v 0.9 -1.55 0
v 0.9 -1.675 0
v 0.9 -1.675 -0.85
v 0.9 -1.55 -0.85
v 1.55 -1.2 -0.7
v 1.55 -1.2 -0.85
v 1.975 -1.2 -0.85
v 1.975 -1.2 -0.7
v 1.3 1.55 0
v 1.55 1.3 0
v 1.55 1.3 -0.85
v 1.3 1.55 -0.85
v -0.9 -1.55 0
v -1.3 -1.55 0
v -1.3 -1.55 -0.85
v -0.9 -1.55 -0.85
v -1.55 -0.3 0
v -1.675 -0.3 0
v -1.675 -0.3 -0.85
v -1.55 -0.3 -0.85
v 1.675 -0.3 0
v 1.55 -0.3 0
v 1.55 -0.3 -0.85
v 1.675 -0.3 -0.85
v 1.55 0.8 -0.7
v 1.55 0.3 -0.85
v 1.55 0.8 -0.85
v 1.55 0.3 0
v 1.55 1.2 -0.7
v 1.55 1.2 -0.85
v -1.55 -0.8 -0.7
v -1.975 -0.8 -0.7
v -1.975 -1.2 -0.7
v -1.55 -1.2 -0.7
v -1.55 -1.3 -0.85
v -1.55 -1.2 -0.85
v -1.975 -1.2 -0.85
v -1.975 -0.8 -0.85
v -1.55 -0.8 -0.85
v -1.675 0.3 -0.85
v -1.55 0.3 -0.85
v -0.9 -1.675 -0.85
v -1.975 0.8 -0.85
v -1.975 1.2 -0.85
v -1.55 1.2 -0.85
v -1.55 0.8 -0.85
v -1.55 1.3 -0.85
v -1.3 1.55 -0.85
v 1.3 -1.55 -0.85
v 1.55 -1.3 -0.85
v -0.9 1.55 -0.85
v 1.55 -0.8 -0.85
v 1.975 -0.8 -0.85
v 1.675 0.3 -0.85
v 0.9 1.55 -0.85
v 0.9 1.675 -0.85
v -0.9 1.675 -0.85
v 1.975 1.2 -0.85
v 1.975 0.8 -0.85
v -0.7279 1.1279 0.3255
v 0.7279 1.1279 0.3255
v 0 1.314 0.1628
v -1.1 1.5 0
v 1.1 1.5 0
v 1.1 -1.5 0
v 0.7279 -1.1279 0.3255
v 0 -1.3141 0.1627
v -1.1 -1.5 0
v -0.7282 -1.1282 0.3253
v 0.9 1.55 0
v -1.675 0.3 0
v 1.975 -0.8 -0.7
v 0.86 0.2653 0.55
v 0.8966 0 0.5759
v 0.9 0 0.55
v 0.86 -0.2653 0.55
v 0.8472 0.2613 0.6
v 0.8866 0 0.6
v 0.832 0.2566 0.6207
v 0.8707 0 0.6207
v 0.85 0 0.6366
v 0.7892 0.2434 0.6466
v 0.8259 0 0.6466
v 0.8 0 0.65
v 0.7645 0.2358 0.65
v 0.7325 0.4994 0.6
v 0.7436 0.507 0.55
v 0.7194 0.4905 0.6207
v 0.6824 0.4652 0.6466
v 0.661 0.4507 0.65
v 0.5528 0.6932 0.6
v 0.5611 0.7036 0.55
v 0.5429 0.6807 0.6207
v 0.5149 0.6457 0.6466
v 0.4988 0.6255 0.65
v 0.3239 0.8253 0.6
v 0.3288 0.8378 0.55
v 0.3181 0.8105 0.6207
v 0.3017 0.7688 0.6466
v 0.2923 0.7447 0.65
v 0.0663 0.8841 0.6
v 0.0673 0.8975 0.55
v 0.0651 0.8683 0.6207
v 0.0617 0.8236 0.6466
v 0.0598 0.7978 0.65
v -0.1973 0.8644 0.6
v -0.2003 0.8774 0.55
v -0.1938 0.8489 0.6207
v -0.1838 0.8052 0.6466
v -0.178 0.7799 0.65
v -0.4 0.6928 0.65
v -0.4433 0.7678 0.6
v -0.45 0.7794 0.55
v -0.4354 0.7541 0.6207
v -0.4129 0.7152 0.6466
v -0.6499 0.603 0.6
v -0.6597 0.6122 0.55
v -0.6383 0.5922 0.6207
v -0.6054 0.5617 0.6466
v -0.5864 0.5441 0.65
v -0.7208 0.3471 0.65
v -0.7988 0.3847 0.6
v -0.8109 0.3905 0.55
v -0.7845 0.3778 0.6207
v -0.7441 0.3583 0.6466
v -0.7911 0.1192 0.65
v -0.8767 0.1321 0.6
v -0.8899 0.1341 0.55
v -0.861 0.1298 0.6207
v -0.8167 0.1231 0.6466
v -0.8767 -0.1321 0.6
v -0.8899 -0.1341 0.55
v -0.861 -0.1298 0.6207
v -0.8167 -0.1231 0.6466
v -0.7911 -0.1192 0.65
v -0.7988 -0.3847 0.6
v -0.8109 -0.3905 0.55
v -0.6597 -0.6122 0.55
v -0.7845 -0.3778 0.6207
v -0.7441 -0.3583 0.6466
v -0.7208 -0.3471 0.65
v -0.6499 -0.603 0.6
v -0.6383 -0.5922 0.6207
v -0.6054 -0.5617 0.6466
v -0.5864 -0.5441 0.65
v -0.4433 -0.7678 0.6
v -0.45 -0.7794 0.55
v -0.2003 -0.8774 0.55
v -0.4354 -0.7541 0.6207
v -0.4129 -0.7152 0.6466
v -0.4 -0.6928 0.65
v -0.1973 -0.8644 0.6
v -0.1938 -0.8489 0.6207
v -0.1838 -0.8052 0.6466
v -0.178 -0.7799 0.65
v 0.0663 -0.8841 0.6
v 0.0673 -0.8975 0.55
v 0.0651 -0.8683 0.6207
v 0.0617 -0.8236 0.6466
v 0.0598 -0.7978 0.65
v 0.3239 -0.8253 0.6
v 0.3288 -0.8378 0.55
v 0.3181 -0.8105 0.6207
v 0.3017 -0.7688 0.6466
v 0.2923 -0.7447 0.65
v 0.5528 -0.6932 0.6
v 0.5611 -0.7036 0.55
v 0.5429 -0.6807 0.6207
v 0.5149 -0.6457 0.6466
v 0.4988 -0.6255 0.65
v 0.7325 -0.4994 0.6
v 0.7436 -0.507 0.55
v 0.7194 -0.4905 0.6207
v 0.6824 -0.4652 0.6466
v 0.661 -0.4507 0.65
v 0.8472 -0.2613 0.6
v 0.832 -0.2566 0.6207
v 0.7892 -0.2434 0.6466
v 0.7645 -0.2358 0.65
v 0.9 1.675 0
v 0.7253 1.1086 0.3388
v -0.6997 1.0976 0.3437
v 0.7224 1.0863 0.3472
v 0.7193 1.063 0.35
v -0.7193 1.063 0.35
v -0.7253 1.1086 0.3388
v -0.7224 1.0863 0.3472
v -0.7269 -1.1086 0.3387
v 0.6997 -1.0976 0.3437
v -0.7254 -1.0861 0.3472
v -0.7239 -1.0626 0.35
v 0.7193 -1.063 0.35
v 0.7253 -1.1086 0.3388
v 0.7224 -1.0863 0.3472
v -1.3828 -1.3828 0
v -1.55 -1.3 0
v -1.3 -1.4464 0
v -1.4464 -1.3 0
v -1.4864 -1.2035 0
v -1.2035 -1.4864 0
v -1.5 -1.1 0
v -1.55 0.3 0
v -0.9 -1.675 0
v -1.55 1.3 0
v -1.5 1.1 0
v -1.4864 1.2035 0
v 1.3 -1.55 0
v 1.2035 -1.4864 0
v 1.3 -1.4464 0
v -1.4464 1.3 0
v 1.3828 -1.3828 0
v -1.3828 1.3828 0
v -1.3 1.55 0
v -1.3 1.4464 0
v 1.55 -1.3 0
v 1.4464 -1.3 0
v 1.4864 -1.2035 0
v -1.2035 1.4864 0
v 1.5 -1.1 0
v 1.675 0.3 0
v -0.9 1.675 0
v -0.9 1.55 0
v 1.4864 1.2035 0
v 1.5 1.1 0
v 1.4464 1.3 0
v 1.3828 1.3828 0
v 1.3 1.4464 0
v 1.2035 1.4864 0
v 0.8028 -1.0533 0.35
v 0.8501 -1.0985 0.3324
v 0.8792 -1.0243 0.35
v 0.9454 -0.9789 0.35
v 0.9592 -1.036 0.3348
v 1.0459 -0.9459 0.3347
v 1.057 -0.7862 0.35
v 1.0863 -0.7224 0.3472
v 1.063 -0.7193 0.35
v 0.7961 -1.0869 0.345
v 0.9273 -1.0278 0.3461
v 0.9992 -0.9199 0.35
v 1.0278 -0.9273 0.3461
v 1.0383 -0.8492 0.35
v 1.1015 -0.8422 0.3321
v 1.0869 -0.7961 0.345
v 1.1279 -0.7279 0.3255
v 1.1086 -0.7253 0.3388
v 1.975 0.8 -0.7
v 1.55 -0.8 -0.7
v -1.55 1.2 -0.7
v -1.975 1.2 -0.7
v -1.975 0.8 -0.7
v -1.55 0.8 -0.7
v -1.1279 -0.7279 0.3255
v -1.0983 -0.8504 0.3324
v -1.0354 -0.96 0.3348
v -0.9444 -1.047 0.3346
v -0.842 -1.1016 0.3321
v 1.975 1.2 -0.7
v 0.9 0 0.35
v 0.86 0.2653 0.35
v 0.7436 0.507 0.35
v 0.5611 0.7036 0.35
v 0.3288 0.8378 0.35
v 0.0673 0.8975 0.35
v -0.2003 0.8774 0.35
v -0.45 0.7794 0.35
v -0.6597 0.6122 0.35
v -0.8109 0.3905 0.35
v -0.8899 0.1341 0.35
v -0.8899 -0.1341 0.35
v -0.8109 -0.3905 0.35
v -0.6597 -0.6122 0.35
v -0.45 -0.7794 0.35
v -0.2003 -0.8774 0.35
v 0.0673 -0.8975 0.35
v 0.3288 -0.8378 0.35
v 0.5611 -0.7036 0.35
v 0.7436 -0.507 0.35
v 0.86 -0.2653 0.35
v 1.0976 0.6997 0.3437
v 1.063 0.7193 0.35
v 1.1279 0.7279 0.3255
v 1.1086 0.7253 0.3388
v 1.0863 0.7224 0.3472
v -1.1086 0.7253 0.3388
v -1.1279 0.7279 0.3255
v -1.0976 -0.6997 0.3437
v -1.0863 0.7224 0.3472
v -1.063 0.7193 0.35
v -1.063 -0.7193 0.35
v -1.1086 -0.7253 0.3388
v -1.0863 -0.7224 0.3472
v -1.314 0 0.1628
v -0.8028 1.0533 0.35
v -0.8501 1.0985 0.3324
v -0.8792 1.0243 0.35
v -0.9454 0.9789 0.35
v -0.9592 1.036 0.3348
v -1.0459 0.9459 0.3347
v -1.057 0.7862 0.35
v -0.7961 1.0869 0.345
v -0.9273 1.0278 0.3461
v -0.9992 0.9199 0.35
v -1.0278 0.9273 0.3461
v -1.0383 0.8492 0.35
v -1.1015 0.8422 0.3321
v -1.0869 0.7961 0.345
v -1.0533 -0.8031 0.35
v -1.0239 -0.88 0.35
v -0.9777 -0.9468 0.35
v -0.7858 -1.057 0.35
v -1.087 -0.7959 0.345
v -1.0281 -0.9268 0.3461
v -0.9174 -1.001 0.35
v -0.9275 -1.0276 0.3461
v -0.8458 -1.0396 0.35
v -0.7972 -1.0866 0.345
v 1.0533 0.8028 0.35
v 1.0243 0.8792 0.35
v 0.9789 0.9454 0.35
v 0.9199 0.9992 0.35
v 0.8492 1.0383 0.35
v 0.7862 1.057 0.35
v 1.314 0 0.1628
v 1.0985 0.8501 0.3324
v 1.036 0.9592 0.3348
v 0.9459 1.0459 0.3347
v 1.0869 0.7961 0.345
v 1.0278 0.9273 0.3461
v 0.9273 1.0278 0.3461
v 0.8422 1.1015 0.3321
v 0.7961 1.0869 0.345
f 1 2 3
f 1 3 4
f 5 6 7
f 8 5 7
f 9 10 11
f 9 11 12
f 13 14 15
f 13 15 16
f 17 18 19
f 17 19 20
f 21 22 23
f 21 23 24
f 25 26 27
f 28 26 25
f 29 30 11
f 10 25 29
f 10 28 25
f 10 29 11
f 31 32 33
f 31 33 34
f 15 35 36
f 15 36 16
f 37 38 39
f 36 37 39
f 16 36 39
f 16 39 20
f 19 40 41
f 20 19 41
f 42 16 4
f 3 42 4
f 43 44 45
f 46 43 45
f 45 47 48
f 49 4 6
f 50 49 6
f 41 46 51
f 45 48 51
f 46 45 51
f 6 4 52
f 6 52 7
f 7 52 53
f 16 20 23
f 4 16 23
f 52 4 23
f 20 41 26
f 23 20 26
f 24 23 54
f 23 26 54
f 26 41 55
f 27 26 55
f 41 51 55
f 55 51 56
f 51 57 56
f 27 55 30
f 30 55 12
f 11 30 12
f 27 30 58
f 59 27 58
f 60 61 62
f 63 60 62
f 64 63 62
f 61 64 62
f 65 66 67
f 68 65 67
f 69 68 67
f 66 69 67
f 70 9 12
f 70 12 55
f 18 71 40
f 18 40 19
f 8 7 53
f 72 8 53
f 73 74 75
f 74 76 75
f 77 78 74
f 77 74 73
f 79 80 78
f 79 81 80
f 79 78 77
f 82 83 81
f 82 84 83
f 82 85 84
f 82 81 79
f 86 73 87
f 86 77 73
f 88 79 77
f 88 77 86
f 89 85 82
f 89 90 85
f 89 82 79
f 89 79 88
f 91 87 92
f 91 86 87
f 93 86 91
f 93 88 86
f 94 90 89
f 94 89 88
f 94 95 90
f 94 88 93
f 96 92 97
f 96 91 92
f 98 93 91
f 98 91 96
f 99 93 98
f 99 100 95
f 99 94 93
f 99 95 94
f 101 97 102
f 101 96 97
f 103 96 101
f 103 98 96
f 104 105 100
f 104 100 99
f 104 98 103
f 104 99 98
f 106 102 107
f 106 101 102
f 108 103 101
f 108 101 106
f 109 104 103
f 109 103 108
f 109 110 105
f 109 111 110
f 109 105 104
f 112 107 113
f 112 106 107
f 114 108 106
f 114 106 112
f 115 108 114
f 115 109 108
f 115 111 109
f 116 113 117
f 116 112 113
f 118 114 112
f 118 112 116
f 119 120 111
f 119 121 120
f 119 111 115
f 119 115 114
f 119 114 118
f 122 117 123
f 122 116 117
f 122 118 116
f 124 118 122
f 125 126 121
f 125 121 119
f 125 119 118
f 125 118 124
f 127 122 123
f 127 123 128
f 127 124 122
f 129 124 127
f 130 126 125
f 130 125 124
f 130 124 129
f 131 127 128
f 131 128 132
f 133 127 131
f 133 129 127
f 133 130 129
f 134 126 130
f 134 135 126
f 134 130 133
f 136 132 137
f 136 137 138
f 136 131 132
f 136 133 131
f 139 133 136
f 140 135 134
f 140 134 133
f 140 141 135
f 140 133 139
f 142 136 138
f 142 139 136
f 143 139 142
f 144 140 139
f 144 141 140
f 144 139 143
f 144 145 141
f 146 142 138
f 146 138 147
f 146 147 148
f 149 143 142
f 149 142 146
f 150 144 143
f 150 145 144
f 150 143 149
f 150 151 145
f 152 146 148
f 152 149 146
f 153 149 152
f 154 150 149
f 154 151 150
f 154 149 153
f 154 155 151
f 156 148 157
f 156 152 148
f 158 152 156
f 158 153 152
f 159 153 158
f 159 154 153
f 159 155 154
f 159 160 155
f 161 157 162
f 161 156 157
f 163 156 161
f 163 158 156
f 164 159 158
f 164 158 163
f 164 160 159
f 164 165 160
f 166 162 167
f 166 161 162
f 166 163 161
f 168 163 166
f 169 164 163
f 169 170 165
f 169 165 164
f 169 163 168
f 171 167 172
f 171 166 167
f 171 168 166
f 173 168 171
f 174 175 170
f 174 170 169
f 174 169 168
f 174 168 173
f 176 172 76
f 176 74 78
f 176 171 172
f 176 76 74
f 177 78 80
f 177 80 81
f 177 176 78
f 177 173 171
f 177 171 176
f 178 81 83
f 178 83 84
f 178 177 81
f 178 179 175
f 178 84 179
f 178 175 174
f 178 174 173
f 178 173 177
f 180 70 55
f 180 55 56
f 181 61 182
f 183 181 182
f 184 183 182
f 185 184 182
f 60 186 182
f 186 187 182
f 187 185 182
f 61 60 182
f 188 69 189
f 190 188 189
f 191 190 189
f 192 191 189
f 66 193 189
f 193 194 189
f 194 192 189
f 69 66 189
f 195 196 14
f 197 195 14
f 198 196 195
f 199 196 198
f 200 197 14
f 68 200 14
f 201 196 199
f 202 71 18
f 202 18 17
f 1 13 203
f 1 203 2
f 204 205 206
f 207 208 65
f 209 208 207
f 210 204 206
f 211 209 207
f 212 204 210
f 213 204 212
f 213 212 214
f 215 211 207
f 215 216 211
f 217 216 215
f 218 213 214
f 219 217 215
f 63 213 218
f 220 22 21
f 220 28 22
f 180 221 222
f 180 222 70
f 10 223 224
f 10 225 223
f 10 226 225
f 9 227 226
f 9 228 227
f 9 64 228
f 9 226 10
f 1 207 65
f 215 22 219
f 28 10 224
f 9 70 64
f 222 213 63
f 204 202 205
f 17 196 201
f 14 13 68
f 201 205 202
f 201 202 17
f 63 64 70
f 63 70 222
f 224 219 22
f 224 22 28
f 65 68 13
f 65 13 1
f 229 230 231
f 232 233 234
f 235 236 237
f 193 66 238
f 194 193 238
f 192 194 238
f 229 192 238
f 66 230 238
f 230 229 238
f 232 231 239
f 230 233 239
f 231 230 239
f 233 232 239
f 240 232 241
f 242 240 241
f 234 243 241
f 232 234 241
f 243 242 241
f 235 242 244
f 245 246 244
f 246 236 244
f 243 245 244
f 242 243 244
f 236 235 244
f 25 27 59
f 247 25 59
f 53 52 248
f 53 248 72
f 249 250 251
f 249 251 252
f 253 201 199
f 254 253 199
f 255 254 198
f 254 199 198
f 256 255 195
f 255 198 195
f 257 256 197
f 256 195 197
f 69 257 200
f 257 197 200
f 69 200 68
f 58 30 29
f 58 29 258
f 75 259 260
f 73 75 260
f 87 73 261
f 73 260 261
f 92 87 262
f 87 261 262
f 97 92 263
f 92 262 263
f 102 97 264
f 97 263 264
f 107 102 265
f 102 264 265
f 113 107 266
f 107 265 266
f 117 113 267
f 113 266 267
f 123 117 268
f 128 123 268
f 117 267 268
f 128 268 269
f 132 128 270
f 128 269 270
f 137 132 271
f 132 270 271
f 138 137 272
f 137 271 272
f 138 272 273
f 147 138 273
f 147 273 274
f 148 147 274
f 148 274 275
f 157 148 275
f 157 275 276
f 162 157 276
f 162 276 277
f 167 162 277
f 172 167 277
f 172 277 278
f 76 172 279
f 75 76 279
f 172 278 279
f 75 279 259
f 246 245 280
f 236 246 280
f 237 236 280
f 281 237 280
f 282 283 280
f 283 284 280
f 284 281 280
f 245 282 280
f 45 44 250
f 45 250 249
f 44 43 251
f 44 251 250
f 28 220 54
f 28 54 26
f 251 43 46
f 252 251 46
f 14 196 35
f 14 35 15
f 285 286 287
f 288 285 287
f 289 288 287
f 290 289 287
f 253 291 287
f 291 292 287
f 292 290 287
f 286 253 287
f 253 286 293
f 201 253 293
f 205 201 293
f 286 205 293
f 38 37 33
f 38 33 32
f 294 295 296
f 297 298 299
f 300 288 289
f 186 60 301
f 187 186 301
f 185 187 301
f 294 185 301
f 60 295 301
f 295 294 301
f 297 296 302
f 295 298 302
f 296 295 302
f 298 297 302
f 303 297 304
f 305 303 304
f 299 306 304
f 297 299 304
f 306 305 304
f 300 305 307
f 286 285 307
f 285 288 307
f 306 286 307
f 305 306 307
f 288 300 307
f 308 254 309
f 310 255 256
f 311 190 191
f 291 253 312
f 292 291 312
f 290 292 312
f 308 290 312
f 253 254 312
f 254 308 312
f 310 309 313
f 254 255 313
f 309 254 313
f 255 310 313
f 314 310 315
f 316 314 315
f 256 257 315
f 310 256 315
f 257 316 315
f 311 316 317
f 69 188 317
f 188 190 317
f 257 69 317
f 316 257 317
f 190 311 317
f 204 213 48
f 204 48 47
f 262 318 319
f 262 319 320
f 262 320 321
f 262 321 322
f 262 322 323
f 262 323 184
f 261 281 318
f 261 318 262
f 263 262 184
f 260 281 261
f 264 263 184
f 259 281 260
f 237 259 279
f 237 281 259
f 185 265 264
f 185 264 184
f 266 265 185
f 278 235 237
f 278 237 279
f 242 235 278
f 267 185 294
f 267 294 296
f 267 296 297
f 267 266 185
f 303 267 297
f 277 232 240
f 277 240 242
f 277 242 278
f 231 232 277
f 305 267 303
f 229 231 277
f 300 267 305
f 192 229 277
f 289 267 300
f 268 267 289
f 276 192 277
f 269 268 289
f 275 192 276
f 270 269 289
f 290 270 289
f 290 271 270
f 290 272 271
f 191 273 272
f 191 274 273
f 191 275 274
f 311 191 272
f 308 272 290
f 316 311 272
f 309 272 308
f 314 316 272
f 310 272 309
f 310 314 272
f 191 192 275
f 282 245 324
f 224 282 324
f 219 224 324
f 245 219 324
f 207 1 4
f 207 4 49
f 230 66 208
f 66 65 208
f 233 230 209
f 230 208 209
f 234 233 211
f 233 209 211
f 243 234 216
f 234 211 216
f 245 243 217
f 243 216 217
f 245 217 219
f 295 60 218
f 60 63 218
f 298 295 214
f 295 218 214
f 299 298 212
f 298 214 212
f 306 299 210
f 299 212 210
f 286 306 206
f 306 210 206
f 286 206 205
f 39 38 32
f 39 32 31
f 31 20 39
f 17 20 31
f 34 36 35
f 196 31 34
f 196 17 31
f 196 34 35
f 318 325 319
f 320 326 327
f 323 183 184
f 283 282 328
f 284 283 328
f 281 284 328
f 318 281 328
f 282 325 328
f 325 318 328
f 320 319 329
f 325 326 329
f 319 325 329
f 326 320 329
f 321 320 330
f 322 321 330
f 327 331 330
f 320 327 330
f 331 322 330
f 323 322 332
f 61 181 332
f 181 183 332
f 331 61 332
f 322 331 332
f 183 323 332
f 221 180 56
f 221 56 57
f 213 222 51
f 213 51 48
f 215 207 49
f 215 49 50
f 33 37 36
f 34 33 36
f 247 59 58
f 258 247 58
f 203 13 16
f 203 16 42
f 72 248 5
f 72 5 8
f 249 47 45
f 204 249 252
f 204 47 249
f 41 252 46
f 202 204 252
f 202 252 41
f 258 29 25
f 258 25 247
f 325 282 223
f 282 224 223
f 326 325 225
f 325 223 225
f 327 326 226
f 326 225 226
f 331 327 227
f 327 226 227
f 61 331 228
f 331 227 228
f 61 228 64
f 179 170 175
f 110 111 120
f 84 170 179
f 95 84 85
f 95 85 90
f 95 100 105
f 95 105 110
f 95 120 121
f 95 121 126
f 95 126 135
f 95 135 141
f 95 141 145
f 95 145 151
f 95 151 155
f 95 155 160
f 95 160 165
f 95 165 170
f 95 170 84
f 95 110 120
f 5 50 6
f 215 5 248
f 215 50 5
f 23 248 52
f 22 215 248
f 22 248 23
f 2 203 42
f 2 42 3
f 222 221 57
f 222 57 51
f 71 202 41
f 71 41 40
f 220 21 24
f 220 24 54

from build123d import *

# Parameters (mm, degrees)
PAD_DEPTH    = 0.85
PAD001_DEPTH = 0.85
SKETCH004_R  = 0.9
PAD002_DEPTH = 0.3
FILLET_R     = 0.1
SKETCH005_W  = 0.725
SKETCH005_H  = 0.4
PAD003_DEPTH = 0.15


with BuildPart() as part:
    # Sketch → Pad (new body)
    with BuildSketch(Plane.XY):
        Polygon((-1.3, -1.55), (1.3, -1.55), (1.55, -1.3), (1.55, 1.3), (1.3, 1.55), (-1.3, 1.55), (-1.55, 1.3), (-1.55, -1.3), align=None)
    extrude(amount=-PAD_DEPTH)

    # Sketch001 → Pad001 (join)
    with BuildSketch(Plane.XY):
        Polygon((-0.9, -1.675), (0.9, -1.675), (0.9, -0.3), (1.675, -0.3), (1.675, 0.3), (0.9, 0.3), (0.9, 1.675), (-0.9, 1.675), (-0.9, 0.3), (-1.675, 0.3), (-1.675, -0.3), (-0.9, -0.3), align=None)
    extrude(amount=-PAD001_DEPTH)

    # Sketch003 → AdditiveLoft section 0
    with BuildSketch(Plane.XY.offset(0.35)):
        with BuildLine():
            Line((-1.1, 0.7), (-1.1, -0.7))
            ThreePointArc((-1.1, -0.7), (-0.982843, -0.982843), (-0.7, -1.1))
            Line((-0.7, -1.1), (0.7, -1.1))
            ThreePointArc((0.7, -1.1), (0.982843, -0.982843), (1.1, -0.7))
            Line((1.1, -0.7), (1.1, 0.7))
            ThreePointArc((1.1, 0.7), (0.982843, 0.982843), (0.7, 1.1))
            Line((0.7, 1.1), (-0.7, 1.1))
            ThreePointArc((-0.7, 1.1), (-0.982843, 0.982843), (-1.1, 0.7))
        make_face()
    # Sketch002 → AdditiveLoft section 1
    with BuildSketch(Plane.XY):
        with BuildLine():
            Line((-1.5, 1.1), (-1.5, -1.1))
            ThreePointArc((-1.5, -1.1), (-1.382843, -1.382843), (-1.1, -1.5))
            Line((-1.1, -1.5), (1.1, -1.5))
            ThreePointArc((1.1, -1.5), (1.382843, -1.382843), (1.5, -1.1))
            Line((1.5, -1.1), (1.5, 1.1))
            ThreePointArc((1.5, 1.1), (1.382843, 1.382843), (1.1, 1.5))
            Line((1.1, 1.5), (-1.1, 1.5))
            ThreePointArc((-1.1, 1.5), (-1.382843, 1.382843), (-1.5, 1.1))
        make_face()
    loft()

    # Sketch004 → Pad002 (join)
    with BuildSketch(Plane.XY.offset(0.35)):
        Circle(SKETCH004_R)
    extrude(amount=PAD002_DEPTH)

    # Fillet
    fillet_edges = [part.edges().sort_by_distance(p)[0] for p in [
        (-0.9, 0, 0.65),
        (0, -1.1, 0.35),
    ]]
    fillet(fillet_edges, radius=FILLET_R)

    # Sketch005 → Pad003 (join)
    with BuildSketch(Plane.XY.offset(-0.85)):
        with Locations((-1.6125, 1)):
            Rectangle(SKETCH005_W, SKETCH005_H)
        with Locations((-1.6125, -1)):
            Rectangle(SKETCH005_W, SKETCH005_H)
        with Locations((1.6125, -1)):
            Rectangle(SKETCH005_W, SKETCH005_H)
        with Locations((1.6125, 1)):
            Rectangle(SKETCH005_W, SKETCH005_H)
    extrude(amount=PAD003_DEPTH)


solid = part.part
